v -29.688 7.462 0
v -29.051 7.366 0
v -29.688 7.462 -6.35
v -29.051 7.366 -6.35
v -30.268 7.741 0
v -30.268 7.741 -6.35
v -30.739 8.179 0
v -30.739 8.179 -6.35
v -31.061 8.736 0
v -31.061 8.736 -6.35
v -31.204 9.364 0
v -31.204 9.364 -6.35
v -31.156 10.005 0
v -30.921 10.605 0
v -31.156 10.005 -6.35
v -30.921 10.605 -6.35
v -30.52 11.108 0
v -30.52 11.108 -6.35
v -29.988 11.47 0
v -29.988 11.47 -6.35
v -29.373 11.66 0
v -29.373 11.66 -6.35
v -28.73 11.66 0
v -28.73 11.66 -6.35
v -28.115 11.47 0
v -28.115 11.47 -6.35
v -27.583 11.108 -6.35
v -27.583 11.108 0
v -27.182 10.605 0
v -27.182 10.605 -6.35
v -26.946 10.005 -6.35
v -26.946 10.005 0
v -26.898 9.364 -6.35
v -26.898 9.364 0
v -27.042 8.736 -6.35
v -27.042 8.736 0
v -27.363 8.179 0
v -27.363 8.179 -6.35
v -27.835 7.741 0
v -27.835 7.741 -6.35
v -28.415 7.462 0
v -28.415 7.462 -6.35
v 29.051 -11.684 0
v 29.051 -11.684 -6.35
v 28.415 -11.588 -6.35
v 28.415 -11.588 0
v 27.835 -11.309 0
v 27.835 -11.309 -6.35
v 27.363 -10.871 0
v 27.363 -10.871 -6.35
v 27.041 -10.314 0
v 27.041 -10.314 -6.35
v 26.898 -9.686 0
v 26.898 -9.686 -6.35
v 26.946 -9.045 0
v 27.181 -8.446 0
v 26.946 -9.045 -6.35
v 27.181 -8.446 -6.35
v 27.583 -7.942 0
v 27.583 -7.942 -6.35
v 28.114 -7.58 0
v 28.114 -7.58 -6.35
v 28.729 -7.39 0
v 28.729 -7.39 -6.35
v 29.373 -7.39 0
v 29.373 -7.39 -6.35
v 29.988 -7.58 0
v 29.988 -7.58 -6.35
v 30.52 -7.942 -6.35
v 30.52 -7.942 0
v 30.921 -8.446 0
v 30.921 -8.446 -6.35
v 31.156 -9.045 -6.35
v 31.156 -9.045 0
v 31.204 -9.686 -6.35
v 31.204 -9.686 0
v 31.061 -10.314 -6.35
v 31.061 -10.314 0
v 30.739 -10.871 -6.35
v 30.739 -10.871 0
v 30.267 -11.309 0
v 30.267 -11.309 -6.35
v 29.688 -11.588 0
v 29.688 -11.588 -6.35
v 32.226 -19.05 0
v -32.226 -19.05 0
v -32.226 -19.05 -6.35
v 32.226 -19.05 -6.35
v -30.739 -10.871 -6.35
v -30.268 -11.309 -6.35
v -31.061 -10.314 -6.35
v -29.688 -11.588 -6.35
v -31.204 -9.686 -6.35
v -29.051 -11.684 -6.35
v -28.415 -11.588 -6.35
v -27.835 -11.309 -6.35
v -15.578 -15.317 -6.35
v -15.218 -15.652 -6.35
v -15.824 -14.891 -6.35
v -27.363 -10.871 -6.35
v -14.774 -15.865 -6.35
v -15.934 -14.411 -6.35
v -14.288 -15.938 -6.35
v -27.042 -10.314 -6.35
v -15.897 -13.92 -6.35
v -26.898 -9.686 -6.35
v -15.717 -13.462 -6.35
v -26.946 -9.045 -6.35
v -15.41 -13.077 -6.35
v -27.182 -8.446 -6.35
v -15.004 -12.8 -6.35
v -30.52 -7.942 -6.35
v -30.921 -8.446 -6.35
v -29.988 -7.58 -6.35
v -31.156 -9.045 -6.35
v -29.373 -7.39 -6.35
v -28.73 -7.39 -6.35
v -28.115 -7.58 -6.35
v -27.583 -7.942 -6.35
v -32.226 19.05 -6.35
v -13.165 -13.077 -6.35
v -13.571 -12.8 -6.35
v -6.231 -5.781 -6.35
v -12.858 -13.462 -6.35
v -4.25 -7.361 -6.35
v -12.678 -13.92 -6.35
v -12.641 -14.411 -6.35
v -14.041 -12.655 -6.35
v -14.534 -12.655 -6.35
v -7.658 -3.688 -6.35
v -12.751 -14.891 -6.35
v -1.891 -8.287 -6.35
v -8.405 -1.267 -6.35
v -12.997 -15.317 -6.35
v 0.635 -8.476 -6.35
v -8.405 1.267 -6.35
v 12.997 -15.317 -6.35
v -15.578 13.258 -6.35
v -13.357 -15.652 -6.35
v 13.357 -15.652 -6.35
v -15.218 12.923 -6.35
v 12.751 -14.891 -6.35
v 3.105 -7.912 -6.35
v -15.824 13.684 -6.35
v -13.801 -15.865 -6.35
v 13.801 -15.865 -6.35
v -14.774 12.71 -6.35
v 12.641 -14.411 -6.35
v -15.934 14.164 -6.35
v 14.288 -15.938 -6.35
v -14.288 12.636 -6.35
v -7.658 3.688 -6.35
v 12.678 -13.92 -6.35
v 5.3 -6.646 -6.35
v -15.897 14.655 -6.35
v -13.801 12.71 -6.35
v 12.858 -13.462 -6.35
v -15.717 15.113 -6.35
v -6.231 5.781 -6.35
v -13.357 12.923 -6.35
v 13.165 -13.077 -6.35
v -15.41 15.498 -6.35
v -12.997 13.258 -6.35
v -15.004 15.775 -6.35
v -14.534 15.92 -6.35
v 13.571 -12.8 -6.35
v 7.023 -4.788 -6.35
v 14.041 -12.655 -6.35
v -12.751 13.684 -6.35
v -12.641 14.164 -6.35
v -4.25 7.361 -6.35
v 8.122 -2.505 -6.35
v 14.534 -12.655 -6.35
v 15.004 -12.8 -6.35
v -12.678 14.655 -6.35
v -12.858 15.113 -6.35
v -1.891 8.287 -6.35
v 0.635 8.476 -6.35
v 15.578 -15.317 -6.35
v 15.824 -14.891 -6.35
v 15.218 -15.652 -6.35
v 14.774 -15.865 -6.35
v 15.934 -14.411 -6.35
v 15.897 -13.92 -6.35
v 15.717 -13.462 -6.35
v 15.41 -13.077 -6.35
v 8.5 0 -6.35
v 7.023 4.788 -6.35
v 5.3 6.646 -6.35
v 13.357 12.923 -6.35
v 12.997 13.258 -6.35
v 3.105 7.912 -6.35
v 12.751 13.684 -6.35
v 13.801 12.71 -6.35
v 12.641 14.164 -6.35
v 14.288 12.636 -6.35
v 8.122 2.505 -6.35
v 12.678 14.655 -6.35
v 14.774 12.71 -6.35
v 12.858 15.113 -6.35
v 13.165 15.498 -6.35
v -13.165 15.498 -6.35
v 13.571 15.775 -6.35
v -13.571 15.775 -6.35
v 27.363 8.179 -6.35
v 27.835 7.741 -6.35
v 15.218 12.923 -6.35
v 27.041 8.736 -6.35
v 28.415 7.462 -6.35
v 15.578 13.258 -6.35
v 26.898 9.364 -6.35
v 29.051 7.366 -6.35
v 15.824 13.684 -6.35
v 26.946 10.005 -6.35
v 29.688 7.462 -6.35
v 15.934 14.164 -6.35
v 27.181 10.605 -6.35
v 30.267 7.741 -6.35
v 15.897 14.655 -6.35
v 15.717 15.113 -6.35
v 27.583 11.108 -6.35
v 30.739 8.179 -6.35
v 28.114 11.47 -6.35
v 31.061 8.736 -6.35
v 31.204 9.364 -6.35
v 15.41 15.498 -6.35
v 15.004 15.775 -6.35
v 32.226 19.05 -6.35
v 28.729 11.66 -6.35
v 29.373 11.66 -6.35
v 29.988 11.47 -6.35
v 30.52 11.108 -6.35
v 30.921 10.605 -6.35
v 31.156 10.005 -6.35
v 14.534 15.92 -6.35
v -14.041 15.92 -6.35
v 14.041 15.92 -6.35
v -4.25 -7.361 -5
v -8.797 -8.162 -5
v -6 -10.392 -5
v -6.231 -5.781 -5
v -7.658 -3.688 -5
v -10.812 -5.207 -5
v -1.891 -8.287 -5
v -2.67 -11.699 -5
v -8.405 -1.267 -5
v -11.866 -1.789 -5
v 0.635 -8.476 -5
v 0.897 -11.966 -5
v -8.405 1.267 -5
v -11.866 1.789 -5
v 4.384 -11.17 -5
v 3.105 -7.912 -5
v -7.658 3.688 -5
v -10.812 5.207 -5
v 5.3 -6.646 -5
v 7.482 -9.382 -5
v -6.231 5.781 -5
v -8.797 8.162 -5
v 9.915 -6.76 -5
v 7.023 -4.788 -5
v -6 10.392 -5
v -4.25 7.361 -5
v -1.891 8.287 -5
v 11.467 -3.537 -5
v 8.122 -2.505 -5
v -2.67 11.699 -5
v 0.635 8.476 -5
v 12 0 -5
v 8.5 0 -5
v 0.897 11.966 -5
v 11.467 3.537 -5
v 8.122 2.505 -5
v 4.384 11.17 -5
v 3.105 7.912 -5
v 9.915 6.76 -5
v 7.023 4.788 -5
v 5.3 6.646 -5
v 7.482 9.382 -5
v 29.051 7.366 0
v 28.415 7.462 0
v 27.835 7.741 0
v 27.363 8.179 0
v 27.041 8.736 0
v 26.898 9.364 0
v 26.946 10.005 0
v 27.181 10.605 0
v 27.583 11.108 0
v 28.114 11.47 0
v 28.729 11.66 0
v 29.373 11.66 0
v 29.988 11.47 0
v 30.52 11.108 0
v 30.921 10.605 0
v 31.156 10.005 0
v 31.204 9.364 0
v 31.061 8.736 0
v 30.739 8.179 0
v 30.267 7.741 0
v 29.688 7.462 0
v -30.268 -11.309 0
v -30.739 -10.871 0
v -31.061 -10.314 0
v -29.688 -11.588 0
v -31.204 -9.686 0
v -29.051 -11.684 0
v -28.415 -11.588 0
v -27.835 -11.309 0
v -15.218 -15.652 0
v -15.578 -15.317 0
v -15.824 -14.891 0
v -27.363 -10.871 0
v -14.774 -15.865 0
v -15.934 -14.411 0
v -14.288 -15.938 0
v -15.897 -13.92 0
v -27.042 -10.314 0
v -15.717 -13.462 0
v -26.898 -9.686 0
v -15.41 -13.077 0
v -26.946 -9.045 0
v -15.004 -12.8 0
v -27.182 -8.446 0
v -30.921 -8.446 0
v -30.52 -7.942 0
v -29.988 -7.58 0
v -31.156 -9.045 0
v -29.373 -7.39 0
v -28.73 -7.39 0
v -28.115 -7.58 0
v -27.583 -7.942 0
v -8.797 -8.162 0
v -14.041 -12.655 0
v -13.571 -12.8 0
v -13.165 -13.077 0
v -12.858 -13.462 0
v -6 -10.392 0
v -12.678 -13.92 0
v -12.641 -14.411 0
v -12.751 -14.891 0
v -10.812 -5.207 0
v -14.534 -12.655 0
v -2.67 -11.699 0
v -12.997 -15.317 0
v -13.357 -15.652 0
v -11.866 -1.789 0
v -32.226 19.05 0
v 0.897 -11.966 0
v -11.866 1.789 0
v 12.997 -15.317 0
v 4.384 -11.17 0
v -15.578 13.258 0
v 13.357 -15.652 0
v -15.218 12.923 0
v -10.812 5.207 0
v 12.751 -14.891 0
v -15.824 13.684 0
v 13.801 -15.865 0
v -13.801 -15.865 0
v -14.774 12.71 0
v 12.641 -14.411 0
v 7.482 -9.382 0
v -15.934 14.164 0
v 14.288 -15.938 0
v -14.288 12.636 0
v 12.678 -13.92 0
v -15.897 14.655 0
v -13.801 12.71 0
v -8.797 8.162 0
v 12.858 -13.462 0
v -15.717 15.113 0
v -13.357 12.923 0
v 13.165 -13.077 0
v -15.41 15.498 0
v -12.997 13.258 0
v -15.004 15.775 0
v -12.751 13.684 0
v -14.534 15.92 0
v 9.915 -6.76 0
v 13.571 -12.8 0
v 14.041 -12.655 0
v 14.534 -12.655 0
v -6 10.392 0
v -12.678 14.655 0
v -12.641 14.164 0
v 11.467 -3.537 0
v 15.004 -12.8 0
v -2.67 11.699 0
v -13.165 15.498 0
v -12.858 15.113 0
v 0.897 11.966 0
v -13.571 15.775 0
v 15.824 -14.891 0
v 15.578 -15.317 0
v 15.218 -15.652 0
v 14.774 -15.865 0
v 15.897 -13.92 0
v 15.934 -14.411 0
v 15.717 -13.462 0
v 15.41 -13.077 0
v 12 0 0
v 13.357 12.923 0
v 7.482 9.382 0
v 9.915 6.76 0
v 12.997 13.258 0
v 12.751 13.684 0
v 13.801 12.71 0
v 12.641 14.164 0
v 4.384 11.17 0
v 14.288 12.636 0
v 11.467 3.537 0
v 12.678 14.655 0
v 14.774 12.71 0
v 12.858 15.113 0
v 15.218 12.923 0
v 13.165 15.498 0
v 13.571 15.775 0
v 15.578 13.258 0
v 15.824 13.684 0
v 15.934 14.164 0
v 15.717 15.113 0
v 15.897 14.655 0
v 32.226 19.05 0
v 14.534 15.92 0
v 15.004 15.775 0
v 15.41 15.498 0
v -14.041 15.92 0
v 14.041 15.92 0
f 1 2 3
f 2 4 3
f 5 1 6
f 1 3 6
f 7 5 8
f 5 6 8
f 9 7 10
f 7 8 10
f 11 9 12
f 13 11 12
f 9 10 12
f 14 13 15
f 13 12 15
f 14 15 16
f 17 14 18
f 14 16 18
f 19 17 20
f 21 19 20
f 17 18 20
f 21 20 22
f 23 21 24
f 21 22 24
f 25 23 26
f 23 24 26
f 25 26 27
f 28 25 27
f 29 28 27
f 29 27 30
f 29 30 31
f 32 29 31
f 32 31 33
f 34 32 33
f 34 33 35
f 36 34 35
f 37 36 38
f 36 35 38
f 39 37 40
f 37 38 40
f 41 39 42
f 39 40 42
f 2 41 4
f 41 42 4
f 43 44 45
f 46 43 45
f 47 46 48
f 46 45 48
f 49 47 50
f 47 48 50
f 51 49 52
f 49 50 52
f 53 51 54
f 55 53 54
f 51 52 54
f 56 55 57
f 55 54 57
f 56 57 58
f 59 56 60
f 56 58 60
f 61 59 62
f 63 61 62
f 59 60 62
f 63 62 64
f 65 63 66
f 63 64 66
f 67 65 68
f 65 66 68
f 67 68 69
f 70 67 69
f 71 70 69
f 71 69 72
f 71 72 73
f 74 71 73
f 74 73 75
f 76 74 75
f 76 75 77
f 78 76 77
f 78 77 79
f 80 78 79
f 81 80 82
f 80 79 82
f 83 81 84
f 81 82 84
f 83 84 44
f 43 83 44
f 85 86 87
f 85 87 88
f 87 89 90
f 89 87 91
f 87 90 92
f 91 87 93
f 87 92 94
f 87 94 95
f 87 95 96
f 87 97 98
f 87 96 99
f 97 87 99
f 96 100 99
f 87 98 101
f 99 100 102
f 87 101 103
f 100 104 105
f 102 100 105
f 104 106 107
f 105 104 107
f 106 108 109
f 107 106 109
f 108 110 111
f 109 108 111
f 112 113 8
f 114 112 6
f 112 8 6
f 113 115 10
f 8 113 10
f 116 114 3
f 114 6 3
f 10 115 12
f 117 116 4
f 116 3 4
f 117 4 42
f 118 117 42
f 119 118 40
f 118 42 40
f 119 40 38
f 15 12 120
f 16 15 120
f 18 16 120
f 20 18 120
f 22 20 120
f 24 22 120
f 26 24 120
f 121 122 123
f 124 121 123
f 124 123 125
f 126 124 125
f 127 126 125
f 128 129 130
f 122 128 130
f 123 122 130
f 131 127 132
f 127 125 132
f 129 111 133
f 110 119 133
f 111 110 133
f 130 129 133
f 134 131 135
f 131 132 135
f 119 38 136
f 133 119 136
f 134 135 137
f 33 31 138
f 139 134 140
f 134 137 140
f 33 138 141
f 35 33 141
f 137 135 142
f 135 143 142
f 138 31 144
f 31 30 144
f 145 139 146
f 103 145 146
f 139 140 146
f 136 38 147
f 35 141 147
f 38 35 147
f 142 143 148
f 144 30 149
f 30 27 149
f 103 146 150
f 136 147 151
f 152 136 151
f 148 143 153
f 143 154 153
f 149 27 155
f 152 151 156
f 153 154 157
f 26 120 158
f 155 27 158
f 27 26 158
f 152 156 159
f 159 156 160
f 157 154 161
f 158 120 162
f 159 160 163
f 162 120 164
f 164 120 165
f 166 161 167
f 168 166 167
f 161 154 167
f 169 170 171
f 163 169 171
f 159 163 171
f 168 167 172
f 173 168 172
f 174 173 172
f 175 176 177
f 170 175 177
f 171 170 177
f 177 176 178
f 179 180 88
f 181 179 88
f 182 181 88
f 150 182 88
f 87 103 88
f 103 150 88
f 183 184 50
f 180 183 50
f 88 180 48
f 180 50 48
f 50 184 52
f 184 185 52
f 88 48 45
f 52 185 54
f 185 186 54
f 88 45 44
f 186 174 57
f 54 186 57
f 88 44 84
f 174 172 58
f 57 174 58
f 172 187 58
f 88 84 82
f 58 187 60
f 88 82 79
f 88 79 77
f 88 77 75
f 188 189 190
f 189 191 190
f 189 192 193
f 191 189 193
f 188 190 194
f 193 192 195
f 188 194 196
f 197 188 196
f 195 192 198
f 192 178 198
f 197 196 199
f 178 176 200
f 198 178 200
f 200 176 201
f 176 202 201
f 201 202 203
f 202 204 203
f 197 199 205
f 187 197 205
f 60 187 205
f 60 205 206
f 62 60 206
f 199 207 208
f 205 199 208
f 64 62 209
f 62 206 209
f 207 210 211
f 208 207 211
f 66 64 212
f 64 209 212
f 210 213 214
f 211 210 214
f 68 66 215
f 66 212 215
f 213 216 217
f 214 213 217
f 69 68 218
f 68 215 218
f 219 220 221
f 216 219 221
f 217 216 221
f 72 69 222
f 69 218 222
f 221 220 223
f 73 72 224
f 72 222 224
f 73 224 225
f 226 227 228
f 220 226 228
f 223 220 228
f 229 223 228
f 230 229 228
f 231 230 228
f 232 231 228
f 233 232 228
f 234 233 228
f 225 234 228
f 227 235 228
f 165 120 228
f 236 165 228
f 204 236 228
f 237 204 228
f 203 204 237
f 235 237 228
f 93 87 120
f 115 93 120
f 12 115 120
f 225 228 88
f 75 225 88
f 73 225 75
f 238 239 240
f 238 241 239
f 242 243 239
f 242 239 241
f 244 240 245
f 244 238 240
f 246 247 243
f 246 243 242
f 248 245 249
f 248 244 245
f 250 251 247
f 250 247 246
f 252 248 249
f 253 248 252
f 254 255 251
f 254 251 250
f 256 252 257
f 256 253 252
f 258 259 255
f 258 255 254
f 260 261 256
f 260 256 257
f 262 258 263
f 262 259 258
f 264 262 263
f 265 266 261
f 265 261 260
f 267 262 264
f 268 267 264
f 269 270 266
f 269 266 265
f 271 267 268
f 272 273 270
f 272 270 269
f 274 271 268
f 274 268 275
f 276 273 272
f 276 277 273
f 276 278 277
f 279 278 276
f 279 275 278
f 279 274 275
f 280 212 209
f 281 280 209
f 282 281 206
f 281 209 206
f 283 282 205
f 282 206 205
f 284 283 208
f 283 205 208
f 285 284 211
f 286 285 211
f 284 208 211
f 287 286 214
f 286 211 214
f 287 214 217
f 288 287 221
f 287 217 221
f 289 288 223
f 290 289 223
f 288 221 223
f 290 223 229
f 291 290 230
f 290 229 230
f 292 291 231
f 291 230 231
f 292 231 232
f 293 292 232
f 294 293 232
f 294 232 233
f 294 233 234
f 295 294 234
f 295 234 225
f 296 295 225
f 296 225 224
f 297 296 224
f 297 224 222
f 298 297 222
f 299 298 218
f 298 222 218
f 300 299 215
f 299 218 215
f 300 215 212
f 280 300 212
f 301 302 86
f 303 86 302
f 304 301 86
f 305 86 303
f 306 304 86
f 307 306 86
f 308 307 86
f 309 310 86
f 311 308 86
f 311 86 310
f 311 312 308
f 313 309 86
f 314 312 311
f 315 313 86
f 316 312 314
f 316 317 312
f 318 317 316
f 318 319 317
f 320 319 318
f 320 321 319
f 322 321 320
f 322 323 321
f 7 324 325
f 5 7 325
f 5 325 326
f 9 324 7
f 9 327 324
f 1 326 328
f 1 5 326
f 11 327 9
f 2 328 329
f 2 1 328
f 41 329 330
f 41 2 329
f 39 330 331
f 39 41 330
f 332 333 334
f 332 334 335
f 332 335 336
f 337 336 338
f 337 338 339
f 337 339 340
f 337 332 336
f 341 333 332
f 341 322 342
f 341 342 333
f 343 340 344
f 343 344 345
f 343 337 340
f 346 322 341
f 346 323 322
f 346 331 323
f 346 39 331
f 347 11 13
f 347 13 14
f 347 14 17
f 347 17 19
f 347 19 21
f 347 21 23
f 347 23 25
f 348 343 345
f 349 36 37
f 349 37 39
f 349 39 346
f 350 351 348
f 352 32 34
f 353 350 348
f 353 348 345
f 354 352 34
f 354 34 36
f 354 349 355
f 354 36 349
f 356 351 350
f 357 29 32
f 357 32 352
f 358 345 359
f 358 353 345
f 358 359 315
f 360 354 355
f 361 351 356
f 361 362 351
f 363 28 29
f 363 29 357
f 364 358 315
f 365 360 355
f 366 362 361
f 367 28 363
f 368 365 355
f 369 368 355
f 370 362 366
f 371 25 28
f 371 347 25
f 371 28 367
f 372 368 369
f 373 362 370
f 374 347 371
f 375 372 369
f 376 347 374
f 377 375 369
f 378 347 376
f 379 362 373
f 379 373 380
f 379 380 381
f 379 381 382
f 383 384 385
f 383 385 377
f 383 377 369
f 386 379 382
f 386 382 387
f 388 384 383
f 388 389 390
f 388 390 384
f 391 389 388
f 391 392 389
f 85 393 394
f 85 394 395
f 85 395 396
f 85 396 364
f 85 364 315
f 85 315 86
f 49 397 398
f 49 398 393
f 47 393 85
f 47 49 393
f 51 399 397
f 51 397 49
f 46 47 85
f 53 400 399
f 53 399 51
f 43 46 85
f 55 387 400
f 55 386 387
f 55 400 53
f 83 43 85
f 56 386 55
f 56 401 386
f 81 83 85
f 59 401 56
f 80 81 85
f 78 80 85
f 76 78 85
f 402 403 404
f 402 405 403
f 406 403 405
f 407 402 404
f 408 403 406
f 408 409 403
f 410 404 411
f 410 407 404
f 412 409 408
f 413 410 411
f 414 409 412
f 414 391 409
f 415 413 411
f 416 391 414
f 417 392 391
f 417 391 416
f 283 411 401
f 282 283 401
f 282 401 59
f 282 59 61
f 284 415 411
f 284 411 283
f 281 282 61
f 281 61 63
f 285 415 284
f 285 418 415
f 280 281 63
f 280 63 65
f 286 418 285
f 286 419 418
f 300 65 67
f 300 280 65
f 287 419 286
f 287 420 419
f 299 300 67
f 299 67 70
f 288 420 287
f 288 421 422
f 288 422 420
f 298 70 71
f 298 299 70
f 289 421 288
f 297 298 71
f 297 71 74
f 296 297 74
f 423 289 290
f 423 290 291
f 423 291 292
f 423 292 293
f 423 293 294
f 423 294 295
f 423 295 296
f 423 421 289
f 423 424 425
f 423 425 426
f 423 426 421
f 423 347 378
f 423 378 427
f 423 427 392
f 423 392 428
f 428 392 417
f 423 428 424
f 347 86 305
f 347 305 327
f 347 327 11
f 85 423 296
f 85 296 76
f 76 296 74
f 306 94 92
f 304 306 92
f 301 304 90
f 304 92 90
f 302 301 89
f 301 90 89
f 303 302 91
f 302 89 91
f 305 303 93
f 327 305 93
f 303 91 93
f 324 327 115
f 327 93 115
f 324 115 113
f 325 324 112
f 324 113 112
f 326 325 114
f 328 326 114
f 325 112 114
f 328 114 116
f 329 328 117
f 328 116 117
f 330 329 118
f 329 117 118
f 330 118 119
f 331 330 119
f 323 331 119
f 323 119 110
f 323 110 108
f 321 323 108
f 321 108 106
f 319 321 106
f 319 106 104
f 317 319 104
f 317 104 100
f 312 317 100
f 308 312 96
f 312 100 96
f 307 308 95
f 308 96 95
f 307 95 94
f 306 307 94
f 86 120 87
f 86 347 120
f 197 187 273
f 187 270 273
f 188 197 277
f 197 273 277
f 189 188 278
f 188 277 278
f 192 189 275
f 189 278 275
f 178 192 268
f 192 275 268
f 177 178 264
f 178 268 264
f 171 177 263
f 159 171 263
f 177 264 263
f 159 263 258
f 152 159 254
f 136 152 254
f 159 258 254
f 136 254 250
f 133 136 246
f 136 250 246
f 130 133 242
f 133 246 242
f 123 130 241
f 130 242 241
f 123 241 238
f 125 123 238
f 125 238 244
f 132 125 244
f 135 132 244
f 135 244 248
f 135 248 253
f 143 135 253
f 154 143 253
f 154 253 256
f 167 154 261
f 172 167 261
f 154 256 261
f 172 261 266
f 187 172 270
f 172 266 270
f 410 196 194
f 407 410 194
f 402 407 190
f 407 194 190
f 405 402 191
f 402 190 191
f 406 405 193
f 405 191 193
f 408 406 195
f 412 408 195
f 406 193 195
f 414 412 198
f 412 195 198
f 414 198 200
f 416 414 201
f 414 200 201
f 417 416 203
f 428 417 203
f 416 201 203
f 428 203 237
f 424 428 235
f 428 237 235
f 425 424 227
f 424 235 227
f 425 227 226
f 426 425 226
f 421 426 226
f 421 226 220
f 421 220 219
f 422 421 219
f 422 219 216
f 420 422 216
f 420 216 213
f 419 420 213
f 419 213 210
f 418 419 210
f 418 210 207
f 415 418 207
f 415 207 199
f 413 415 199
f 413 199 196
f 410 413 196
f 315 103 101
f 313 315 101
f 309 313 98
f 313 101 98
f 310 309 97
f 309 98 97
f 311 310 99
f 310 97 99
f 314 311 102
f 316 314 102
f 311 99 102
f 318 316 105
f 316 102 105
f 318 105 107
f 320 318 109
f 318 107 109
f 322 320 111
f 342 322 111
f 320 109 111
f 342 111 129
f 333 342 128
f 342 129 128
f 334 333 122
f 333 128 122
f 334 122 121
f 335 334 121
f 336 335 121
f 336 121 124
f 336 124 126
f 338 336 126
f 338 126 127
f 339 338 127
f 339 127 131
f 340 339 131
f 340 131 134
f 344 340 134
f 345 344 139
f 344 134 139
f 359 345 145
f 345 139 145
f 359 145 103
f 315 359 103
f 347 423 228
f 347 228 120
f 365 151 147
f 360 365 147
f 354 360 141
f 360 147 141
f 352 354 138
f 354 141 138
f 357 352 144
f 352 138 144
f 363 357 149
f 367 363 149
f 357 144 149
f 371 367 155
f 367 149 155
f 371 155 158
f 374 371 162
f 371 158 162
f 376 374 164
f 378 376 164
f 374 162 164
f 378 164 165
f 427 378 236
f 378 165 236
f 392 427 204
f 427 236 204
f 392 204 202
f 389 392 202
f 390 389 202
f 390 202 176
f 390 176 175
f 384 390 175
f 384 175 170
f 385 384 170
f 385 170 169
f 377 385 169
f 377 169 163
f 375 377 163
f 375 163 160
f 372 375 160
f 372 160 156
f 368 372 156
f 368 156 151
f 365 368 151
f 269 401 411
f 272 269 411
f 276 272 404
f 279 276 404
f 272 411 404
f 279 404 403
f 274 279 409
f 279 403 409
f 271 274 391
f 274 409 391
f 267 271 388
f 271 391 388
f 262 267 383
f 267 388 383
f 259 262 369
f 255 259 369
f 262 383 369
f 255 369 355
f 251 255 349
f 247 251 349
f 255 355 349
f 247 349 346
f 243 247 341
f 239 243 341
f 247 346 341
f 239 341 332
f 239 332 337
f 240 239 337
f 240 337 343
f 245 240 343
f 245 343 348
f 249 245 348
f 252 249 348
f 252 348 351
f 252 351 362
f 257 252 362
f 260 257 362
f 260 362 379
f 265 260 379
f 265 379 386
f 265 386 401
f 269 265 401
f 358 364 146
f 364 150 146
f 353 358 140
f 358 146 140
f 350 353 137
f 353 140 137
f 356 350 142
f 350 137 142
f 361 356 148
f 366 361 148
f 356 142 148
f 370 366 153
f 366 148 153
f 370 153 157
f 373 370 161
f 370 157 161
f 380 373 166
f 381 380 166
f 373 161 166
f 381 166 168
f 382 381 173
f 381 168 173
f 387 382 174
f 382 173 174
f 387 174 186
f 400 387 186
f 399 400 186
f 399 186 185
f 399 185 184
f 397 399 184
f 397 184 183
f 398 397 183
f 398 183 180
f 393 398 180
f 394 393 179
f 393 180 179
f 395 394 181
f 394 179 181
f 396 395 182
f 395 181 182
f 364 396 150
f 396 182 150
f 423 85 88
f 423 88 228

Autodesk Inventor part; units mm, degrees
ref_plane "YZ Plane" through (0, 0, 0) normal (1, 0, 0) x (0, 1, 0)
ref_plane "XZ Plane" through (0, 0, 0) normal (0, 1, 0) x (-1, 0, 0)
ref_plane "XY Plane" through (0, 0, 0) normal (0, 0, 1) x (1, 0, 0)
sketch "Sketch1" plane through (0, 0, 0) normal (0, 0, 1) x (1, 0, 0)
  line L0 (-32.2263, -19.05) -> (32.2263, -19.05)
  line L1 (32.2263, -19.05) -> (32.2263, 19.05)
  line L2 (32.2263, 19.05) -> (-32.2263, 19.05)
  line L3 (-32.2263, 19.05) -> (-32.2263, -19.05)
  line L4 (-32.2263, -19.05) -> (32.2263, 19.05) construction
  line L5 (32.2263, -19.05) -> (-32.2263, 19.05) construction
  line L6 (-25.8762, 19.05) -> (-25.8762, -19.05) construction
  line L7 (25.8762, 19.05) -> (25.8762, -19.05) construction
  line L8 (-29.0512, 19.05) -> (-29.0512, -19.05) construction
  line L9 (29.0512, 19.05) -> (29.0512, -19.05) construction
  line L10 (-32.2263, 0) -> (32.2263, 0) construction
  circle A0 centre (0, 0) radius 12
  circle A1 centre (0, 0) radius 8.5
  line L11 (-17.4625, -17.4625) -> (17.4625, -17.4625) construction
  line L12 (17.4625, -17.4625) -> (17.4625, 17.4625) construction
  line L13 (17.4625, 17.4625) -> (-17.4625, 17.4625) construction
  line L14 (-17.4625, 17.4625) -> (-17.4625, -17.4625) construction
  line L15 (-17.4625, -17.4625) -> (17.4625, 17.4625) construction
  line L16 (17.4625, -17.4625) -> (-17.4625, 17.4625) construction
  circle A2 centre (-14.2875, 14.2875) radius 3.175 construction
  line L17 (14.2875, -14.2875) -> (-14.2875, -14.2875) construction
  line L18 (-14.2875, -14.2875) -> (-14.2875, 14.2875) construction
  line L19 (-14.2875, 14.2875) -> (14.2875, 14.2875) construction
  line L20 (14.2875, 14.2875) -> (14.2875, -14.2875) construction
  line L21 (14.2875, -14.2875) -> (-14.2875, 14.2875) construction
  line L22 (-14.2875, -14.2875) -> (14.2875, 14.2875) construction
  point P0 (-29.0513, 9.525)
  point P1 (-29.0513, -9.525)
  point P2 (29.0512, -9.525)
  point P3 (29.0512, 9.525)
  dimension "d0" = 64.4525
  dimension "d1" = 38.1
  dimension "d2" = 6.35
  dimension "d3" = 6.35
  dimension "d4" = 9.525
  dimension "d5" = 9.525
  dimension "d6" = 24
  dimension "d18" = 17
  dimension "d19" = 34.925
  dimension "d20" = 34.925
  dimension "d21" = 6.35
extrude "Extrusion1" add sketch "Sketch1" against normal blind 6.35 contours L3 L2 L1 L0 | A0
hole "Hole1" at (-29.0513, 9.525, 0) at (-29.0513, -9.525, 0) at (29.0512, -9.525, 0) at (29.0512, 9.525, 0) direction (0, 0, -1) diameter 4.318 end through all clearance for "Flat Head Machine Screw (82)" size "#8" standard "Ansi Unified Screw Threads"
extrude "Extrusion2" cut sketch "Sketch1" against normal blind 5 contours A0 | A1
hole "Hole2" at (-14.2875, 14.2875, 0) at (-14.2875, -14.2875, 0) at (14.2875, -14.2875, 0) at (14.2875, 14.2875, 0) direction (0, 0, -1) diameter 3.302 end through all thread size "8-32 UNC" class "2B" standard "ANSI Unified Screw Threads"
equation "\"d5\" = d4"
equation "\"d20\" = d19"
properties part number "Module Top Plate" material "Aluminum 6061"
